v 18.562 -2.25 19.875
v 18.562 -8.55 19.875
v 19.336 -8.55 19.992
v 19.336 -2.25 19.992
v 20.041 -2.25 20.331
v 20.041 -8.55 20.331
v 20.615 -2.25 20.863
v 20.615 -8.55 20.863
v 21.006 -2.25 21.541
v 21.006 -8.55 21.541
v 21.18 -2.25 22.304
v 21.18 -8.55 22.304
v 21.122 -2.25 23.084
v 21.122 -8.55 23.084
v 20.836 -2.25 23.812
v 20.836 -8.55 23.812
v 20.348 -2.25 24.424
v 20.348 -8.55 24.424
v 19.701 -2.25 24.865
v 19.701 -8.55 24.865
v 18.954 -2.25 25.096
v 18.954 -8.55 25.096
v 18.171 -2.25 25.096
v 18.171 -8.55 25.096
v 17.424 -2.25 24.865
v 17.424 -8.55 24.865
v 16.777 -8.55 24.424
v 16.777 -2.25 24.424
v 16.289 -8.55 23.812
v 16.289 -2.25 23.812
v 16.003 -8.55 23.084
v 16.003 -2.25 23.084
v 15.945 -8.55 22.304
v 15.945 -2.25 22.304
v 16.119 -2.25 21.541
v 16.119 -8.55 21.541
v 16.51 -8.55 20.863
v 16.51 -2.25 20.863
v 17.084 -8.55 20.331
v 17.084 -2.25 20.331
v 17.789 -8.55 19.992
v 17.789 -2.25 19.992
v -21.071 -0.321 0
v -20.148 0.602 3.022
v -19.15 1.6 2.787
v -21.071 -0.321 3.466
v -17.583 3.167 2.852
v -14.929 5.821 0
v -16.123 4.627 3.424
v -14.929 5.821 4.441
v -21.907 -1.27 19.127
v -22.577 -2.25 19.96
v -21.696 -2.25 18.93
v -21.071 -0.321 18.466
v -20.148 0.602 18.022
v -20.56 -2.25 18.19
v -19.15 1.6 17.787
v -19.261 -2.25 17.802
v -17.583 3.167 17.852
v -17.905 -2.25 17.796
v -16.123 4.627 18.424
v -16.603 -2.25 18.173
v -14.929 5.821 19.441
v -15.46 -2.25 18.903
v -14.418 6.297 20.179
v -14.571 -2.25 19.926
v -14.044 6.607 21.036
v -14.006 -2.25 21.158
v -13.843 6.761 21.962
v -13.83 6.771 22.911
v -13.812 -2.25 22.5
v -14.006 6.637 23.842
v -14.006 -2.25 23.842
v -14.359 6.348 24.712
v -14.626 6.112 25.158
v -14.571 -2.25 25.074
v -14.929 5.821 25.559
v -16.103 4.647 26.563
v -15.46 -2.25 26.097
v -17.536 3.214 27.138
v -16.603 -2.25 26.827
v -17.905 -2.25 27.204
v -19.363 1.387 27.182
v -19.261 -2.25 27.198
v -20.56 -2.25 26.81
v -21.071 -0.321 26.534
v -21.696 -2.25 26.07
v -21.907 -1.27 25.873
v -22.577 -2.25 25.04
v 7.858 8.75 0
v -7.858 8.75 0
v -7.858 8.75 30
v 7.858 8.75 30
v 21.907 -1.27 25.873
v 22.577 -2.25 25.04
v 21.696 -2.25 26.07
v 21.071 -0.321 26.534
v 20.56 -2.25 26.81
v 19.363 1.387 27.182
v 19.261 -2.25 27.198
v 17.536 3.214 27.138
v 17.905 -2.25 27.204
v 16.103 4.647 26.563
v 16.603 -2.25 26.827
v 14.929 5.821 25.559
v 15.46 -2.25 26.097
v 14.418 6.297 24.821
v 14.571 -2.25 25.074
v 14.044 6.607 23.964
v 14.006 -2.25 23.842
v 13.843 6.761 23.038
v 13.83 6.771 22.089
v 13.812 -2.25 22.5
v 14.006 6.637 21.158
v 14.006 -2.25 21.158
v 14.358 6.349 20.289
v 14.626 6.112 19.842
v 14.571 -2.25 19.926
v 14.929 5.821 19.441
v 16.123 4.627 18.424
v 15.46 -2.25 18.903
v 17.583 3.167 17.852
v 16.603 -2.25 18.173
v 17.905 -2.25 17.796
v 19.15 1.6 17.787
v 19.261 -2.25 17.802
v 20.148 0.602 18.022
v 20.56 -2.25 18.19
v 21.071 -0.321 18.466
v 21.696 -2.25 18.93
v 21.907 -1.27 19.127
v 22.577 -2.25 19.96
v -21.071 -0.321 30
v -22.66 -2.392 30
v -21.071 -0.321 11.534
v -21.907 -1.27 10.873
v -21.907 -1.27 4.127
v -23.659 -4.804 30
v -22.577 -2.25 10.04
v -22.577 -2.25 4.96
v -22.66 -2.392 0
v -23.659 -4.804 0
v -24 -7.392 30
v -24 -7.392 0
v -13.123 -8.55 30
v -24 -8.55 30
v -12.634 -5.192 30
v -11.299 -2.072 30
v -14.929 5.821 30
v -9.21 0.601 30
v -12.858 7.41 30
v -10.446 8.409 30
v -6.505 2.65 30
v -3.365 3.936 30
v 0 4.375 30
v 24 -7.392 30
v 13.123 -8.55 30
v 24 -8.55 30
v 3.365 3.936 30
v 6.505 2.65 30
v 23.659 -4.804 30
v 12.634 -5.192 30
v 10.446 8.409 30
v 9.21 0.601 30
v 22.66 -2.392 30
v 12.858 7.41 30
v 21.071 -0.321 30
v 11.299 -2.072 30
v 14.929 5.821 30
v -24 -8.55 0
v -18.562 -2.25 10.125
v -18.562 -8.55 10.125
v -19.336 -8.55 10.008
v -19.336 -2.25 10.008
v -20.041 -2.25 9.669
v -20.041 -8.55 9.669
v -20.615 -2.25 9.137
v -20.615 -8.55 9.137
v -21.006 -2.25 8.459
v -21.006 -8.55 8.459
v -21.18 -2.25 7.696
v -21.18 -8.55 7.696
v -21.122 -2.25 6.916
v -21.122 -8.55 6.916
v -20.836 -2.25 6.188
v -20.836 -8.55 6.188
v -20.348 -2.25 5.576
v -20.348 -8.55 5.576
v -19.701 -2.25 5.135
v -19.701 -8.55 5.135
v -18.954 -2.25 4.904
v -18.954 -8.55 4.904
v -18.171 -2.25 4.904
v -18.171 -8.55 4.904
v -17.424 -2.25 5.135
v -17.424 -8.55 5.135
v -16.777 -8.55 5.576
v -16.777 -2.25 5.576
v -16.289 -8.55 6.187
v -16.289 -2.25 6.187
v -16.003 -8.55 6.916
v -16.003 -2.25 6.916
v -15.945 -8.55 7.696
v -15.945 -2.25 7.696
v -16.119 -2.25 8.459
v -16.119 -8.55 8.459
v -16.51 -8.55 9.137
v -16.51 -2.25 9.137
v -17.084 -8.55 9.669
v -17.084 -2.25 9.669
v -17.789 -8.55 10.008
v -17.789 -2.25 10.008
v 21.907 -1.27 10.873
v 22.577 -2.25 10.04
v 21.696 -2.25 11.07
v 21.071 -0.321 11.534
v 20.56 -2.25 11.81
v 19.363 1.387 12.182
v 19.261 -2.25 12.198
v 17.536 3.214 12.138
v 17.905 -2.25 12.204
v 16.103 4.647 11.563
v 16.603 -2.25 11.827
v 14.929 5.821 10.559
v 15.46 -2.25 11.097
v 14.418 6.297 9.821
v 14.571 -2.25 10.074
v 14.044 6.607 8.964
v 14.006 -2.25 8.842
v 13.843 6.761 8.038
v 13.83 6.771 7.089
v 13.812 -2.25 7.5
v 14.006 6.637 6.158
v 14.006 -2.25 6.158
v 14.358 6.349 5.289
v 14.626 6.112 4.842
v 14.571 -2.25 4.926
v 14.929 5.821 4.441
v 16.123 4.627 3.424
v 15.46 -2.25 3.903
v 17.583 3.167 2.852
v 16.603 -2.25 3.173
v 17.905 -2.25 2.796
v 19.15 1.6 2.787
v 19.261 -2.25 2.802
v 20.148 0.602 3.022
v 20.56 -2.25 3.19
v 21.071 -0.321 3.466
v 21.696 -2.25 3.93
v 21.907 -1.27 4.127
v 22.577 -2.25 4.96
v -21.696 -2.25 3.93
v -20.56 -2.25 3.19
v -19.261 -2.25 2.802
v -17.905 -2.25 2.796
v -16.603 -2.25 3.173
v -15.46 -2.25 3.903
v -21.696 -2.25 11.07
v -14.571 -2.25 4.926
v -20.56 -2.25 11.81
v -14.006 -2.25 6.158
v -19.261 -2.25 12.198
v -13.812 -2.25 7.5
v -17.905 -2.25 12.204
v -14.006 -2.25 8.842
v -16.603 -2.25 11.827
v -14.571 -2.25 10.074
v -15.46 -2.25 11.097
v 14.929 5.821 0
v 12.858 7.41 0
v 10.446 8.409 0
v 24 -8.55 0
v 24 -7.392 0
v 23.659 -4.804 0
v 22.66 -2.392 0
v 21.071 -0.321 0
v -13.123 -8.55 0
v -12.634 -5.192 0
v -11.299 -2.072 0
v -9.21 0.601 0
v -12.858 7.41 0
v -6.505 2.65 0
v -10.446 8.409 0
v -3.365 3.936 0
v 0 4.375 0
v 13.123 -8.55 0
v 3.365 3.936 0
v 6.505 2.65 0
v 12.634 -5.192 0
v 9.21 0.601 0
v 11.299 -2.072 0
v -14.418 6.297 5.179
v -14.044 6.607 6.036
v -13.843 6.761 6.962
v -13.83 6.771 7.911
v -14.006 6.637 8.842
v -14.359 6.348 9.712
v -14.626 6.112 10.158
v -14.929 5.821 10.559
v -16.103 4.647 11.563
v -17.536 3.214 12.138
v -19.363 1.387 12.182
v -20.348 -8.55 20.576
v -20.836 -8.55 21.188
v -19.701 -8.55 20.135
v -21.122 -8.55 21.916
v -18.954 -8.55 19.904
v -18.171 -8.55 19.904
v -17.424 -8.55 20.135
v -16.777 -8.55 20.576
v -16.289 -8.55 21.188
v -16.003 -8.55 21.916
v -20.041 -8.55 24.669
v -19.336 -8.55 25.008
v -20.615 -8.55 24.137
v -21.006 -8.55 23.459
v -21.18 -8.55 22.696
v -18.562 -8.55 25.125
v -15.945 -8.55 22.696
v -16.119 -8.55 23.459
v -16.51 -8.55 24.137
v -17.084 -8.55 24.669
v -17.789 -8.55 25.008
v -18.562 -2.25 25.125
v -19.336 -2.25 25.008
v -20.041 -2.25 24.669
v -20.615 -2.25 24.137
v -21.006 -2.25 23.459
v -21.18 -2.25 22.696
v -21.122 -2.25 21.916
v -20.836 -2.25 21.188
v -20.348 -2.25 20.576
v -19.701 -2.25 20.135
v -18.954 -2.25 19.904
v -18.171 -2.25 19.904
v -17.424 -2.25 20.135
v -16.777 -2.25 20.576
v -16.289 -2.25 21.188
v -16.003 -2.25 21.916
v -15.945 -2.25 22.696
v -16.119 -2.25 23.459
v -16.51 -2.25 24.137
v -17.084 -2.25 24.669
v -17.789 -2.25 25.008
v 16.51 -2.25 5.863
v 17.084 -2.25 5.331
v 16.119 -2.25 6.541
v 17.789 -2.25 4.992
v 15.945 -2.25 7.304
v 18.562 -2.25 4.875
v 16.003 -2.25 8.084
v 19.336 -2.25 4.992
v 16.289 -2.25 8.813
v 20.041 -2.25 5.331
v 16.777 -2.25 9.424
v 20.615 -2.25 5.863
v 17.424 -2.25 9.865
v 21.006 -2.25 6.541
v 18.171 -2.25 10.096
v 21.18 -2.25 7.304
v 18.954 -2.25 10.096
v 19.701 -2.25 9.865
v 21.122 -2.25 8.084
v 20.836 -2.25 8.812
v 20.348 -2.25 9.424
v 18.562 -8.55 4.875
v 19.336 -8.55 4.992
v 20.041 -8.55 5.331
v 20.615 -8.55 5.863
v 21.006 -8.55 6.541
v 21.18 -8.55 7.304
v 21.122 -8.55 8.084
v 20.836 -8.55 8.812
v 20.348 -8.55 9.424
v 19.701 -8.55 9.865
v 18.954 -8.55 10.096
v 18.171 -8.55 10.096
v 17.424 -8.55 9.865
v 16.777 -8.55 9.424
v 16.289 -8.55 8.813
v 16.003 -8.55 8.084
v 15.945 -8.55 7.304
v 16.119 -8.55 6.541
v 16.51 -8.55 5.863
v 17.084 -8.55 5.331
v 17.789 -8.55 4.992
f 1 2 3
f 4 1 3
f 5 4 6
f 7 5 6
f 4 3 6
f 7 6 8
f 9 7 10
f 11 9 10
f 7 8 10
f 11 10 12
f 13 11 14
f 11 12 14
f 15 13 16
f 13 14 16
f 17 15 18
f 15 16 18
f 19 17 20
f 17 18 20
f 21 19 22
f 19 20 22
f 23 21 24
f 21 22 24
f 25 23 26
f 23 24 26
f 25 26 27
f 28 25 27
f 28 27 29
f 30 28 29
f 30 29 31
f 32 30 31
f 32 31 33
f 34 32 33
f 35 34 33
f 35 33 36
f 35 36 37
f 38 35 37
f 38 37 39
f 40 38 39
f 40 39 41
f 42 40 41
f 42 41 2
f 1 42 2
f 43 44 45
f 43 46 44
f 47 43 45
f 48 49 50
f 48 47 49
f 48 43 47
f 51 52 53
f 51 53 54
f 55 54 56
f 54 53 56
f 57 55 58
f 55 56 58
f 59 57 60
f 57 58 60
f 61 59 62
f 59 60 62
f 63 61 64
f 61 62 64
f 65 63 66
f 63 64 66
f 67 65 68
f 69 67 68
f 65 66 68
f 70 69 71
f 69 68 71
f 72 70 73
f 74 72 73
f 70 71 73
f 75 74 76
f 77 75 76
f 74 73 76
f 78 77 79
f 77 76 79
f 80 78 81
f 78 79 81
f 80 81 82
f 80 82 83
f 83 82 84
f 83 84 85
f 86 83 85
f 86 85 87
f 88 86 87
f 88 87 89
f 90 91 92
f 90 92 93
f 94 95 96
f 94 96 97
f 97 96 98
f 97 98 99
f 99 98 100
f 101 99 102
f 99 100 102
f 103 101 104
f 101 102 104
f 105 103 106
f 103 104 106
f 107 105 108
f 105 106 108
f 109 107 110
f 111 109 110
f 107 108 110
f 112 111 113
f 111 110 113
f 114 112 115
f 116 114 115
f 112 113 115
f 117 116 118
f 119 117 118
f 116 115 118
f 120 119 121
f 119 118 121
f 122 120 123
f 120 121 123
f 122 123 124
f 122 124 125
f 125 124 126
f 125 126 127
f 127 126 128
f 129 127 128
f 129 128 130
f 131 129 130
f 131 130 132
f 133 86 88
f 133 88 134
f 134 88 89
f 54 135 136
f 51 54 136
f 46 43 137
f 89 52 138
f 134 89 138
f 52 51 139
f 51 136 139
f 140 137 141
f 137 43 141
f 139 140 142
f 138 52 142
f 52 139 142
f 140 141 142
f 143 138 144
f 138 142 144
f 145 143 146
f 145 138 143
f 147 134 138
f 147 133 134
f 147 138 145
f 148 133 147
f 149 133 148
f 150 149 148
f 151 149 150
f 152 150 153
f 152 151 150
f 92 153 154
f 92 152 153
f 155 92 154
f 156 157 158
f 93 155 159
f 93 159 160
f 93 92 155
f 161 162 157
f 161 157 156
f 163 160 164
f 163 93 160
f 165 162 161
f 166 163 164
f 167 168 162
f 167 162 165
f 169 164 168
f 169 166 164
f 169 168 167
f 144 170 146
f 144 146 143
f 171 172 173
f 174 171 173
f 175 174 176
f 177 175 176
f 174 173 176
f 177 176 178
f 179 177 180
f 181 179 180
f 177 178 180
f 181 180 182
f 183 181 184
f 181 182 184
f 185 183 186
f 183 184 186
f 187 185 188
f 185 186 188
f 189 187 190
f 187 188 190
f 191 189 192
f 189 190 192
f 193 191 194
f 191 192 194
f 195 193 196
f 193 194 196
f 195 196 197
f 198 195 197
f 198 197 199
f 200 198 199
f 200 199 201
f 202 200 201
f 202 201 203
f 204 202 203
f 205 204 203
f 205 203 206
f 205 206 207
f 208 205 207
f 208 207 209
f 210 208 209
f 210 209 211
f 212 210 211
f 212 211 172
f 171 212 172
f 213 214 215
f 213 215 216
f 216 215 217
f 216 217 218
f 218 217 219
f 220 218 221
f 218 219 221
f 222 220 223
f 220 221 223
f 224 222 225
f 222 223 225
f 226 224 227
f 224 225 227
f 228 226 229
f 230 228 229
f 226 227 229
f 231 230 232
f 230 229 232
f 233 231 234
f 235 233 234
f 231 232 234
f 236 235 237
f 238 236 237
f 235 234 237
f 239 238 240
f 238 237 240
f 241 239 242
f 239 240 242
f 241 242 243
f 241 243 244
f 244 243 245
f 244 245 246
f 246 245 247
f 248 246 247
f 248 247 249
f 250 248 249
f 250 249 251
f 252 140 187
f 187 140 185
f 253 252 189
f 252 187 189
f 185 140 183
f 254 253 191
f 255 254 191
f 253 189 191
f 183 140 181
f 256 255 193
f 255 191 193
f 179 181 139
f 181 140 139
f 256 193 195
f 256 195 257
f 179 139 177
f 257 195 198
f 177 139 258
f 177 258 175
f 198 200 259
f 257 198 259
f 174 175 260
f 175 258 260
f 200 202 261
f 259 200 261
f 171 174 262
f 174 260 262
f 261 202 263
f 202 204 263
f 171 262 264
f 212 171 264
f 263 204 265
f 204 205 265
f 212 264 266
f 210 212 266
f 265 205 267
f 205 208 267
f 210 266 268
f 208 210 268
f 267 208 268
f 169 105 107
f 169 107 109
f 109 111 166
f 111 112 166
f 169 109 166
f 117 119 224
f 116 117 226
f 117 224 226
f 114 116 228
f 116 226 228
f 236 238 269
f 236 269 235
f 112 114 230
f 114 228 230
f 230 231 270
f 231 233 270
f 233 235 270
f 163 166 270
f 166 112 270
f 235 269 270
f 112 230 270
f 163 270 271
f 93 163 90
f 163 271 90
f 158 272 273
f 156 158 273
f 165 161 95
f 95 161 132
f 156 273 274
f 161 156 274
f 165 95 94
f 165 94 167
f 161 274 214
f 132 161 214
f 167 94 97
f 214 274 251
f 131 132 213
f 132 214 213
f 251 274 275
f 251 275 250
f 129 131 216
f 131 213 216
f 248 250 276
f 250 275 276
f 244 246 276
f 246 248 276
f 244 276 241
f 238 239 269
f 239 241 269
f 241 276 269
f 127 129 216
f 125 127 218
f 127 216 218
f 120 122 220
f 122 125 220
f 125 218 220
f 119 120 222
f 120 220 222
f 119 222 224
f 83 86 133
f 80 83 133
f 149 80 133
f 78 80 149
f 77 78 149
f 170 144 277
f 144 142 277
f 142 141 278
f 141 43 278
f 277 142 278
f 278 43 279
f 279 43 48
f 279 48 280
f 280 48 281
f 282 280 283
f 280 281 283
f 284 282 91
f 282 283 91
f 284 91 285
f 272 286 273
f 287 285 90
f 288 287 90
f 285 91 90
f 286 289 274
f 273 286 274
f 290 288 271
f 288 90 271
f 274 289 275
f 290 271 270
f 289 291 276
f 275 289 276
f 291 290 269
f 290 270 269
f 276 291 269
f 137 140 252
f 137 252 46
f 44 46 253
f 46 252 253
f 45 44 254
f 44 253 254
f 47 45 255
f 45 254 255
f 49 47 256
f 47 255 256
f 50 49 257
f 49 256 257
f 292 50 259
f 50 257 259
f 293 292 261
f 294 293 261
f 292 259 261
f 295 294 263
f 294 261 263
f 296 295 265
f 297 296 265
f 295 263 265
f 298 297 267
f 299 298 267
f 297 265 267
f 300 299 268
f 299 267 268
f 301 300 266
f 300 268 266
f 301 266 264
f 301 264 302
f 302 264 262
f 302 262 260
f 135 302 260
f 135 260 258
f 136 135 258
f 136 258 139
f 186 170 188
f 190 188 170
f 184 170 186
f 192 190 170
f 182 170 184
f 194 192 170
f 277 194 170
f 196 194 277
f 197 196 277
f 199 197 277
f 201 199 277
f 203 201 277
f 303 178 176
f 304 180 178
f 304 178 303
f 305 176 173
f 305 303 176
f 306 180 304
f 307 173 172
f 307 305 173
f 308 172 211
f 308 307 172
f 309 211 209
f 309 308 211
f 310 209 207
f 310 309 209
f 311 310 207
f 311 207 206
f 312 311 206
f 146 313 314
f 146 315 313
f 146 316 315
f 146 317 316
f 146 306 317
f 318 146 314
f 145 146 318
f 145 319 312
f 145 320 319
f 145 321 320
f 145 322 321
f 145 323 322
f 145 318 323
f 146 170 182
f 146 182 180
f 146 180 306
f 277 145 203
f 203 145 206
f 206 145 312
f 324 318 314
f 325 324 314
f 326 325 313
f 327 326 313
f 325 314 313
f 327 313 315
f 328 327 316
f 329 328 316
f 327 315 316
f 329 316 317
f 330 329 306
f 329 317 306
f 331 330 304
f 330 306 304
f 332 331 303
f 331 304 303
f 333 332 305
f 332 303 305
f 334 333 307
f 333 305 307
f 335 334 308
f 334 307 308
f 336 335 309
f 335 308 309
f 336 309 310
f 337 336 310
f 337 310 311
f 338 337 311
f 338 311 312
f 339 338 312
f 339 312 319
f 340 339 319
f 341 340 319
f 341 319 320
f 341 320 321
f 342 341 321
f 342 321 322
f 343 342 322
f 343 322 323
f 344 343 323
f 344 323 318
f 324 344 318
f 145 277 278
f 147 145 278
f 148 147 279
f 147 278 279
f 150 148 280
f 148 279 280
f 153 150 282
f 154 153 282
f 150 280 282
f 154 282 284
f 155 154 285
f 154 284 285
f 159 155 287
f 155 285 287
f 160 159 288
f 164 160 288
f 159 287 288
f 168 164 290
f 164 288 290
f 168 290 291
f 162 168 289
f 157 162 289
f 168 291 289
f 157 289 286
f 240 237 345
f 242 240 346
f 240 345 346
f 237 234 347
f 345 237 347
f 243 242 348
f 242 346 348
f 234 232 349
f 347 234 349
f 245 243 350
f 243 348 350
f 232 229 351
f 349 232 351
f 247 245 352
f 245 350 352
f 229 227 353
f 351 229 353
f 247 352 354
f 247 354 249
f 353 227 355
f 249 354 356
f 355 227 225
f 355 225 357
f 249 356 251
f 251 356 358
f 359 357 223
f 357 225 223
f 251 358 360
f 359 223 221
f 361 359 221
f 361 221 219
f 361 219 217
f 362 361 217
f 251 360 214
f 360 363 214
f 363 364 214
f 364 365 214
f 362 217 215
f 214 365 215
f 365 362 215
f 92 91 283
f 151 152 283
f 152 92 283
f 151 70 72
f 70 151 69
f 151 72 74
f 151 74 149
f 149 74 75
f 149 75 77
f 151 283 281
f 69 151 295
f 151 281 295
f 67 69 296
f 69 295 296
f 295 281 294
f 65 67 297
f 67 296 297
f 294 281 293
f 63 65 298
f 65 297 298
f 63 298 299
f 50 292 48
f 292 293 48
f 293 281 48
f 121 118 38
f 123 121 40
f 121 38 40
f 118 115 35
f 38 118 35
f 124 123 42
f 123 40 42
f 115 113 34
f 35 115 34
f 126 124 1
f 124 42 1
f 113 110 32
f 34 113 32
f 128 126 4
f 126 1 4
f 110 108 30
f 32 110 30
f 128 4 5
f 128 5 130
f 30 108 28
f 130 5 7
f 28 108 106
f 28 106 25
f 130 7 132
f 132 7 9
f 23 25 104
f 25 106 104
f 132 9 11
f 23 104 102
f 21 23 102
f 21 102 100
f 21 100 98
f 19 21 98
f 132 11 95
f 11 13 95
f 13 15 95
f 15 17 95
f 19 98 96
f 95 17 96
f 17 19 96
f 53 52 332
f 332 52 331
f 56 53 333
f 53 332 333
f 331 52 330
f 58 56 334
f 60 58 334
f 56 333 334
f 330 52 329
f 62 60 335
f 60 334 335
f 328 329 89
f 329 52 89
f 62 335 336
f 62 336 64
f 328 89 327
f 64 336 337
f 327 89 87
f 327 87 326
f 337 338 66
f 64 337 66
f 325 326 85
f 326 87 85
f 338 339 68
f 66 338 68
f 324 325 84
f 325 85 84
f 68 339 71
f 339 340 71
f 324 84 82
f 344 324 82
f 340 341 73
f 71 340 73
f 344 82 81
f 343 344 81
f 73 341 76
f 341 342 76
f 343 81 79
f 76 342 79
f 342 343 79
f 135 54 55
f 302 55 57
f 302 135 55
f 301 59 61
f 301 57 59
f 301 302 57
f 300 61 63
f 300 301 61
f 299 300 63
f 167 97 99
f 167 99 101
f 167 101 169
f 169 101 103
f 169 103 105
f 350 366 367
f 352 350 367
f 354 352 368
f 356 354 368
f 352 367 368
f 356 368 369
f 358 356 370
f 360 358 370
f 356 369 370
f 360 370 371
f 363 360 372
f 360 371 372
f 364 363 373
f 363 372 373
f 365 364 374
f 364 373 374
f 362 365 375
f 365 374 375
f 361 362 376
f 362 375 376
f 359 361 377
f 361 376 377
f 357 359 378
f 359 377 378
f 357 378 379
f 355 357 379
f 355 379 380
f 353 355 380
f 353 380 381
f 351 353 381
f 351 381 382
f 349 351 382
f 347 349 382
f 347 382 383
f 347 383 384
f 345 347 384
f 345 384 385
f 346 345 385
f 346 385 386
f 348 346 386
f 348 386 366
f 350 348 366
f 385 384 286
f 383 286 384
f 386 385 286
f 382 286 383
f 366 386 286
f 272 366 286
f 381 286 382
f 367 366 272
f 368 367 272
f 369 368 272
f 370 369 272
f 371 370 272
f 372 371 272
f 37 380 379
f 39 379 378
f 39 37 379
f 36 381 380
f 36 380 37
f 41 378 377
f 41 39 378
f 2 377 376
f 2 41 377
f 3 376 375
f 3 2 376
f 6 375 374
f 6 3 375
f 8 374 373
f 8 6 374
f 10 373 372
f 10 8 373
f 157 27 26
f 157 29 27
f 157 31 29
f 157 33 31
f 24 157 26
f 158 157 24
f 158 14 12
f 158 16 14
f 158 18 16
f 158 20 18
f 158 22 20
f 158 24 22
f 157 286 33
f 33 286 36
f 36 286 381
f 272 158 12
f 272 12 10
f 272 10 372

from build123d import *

# Parameters (mm, degrees)
SKETCH1_W              = 48
SKETCH1_H              = 17.5
BODY_DEPTH             = 30
TUBE_CUTOUT_DEPTH      = 40.402569713
SKETCH3_R              = 2.625
CUT_EXTRUDE_M5_DEPTH   = 43.216702856
SLOPE_DEPTH            = 40.402569713
BOLT_HEAD_CUTOUT_START = -6.5
SKETCH5_R              = 4.75
BOLT_HEAD_CUTOUT_DEPTH = 23
FILLET_2_R             = 10
SKETCH7_W              = 48
SKETCH7_H              = 30
CLEARANCE_DEPTH        = 0.2


with BuildPart() as part:
    # Sketch1 → body (new body)
    with BuildSketch(Plane.XY):
        Rectangle(SKETCH1_W, SKETCH1_H)
    extrude(amount=BODY_DEPTH)

    # Sketch2 → tube_cutout (cut, through all)
    with BuildSketch(Plane.XY):
        with BuildLine():
            Line((13.125, -8.75), (-13.125, -8.75))
            ThreePointArc((-13.125, -8.75), (0, 4.375), (13.125, -8.75))
        make_face()
    extrude(amount=TUBE_CUTOUT_DEPTH, mode=Mode.SUBTRACT)

    # Sketch3 → Cut-Extrude M5 (cut, through all)
    with BuildSketch(Plane.XZ.offset(8.75)):
        with Locations(Location((18.5625, 22.5, 0), (0, 0, 270))):
            Circle(SKETCH3_R)
        with Locations(Location((18.5625, 7.5, 0), (0, 0, 270))):
            Circle(SKETCH3_R)
        with Locations(Location((-18.5625, 7.5, 0), (0, 0, 90))):
            Circle(SKETCH3_R)
        with Locations(Location((-18.5625, 22.5, 0), (0, 0, 90))):
            Circle(SKETCH3_R)
    extrude(amount=-CUT_EXTRUDE_M5_DEPTH, mode=Mode.SUBTRACT)

    # Sketch4 → slope (cut, through all)
    with BuildSketch(Plane.XY):
        Polygon((-24, 8.75), (-24, -3.25), (-12, 8.75), align=None)
        Polygon((24, -3.25), (12, 8.75), (24, 8.75), align=None)
    extrude(amount=SLOPE_DEPTH, mode=Mode.SUBTRACT)

    # Sketch5 → bolt_head_cutout (cut)
    with BuildSketch(Plane.XZ.offset(8.75).offset(BOLT_HEAD_CUTOUT_START)):
        with Locations((18.5625, 22.5)):
            Circle(SKETCH5_R)
        with Locations((18.5625, 7.5)):
            Circle(SKETCH5_R)
        with Locations((-18.5625, 7.5)):
            Circle(SKETCH5_R)
        with Locations((-18.5625, 22.5)):
            Circle(SKETCH5_R)
    extrude(amount=-BOLT_HEAD_CUTOUT_DEPTH, mode=Mode.SUBTRACT)

    # fillet 2
    # the kernel refuses this fillet: 10 mm, written as the material it takes off along each edge
    with BuildSketch(Plane(origin=(24, -3.25, -10.355339059), x_dir=(-0.7071067811865475, 0.7071067811865478, 0), z_dir=(0, 0, 1)), Plane(origin=(12, 8.75, -10.355339059), x_dir=(-1, 0, 0), z_dir=(0, 0, 1)), Plane(origin=(-12, 8.75, -10.355339059), x_dir=(-0.7071067811865474, -0.7071067811865478, 0), z_dir=(0, 0, 1))) as fillet_2_piece_1:
        with BuildLine():
            CenterArc((FILLET_2_R * 0.414213562373, FILLET_2_R), FILLET_2_R, 225, 45)
            Line((-FILLET_2_R * 0.292893218813, FILLET_2_R * 0.292893218813), (0, 0))
            Line((0, 0), (FILLET_2_R * 0.414213562373, 0))
        make_face()
    extrude(amount=50.710678119, mode=Mode.SUBTRACT)
    with BuildSketch(Plane(origin=(-24, -3.25, -10.355339059), x_dir=(0.7071067811865469, 0.707106781186548, 0), z_dir=(0, 0, 1))) as fillet_2_piece_2:
        with BuildLine():
            CenterArc((FILLET_2_R * 0.414213562373, -FILLET_2_R), FILLET_2_R, 90, 45)
            Line((-FILLET_2_R * 0.292893218813, -FILLET_2_R * 0.292893218813), (0, 0))
            Line((0, 0), (FILLET_2_R * 0.414213562373, 0))
        make_face()
    extrude(amount=50.710678119, mode=Mode.SUBTRACT)

    # Sketch7 → clearance (cut)
    with BuildSketch(Plane.XZ.offset(8.75)):
        with Locations((0, 15)):
            Rectangle(SKETCH7_W, SKETCH7_H)
    extrude(amount=-CLEARANCE_DEPTH, mode=Mode.SUBTRACT)


solid = part.part
